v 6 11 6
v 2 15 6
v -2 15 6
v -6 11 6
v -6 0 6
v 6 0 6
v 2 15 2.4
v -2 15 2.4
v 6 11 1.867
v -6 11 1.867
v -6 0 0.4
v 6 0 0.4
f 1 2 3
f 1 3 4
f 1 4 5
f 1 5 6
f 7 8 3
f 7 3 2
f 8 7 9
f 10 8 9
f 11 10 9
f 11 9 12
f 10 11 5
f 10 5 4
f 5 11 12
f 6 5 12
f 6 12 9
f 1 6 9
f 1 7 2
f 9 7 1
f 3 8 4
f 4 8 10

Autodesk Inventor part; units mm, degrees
ref_plane "YZ Plane" through (0, 0, 0) normal (1, 0, 0) x (0, 1, 0)
ref_plane "XZ Plane" through (0, 0, 0) normal (0, 1, 0) x (-1, 0, 0)
ref_plane "XY Plane" through (0, 0, 0) normal (0, 0, 1) x (1, 0, 0)
sketch "Sketch1" plane through (0, 0, 0) normal (0, 0, 1) x (1, 0, 0)
  line L0 (0, 0) -> (6, 0)
  line L1 (6, 0) -> (6, 11)
  line L2 (0, 0) -> (-6, 0)
  line L3 (-6, 0) -> (-6, 11)
  line L4 (0, 0) -> (0, 15)
  line L5 (0, 15) -> (2, 15)
  line L6 (2, 15) -> (6, 11)
  line L7 (0, 15) -> (-2, 15)
  line L8 (-2, 15) -> (-6, 11)
  dimension "d0" = 6
  dimension "d1" = 11
  dimension "d2" = 6
  dimension "d3" = 11
  dimension "d4" = 15
  dimension "d5" = 2
  dimension "d6" = 2
extrude "Extrusion1" add sketch "Sketch1" along normal blind 6
sketch "Sketch2" plane through (6, 0, 0) normal (1, 0, 0) x (0, 0, -1)
  line L0 (0, 11) -> (0, 15) projected
  line L1 (0, 0) -> (0, 15)
  line L2 (0, 15) -> (-2, 15)
  line L3 (0, 15) -> (-6, 15) projected
  line L4 (0, 11) -> (0, 0) projected
  line L5 (0, 0) -> (-0.4, 0)
  line L6 (0, 0) -> (-6, 0) projected
  line L7 (-2, 15) -> (-2.4, 15)
  line L8 (-2.4, 15) -> (-0.4, 0)
  dimension "d9" = 2
extrude "Extrusion2" cut sketch "Sketch2" against normal blind 17.9375
properties part number "middle-join-inside"
